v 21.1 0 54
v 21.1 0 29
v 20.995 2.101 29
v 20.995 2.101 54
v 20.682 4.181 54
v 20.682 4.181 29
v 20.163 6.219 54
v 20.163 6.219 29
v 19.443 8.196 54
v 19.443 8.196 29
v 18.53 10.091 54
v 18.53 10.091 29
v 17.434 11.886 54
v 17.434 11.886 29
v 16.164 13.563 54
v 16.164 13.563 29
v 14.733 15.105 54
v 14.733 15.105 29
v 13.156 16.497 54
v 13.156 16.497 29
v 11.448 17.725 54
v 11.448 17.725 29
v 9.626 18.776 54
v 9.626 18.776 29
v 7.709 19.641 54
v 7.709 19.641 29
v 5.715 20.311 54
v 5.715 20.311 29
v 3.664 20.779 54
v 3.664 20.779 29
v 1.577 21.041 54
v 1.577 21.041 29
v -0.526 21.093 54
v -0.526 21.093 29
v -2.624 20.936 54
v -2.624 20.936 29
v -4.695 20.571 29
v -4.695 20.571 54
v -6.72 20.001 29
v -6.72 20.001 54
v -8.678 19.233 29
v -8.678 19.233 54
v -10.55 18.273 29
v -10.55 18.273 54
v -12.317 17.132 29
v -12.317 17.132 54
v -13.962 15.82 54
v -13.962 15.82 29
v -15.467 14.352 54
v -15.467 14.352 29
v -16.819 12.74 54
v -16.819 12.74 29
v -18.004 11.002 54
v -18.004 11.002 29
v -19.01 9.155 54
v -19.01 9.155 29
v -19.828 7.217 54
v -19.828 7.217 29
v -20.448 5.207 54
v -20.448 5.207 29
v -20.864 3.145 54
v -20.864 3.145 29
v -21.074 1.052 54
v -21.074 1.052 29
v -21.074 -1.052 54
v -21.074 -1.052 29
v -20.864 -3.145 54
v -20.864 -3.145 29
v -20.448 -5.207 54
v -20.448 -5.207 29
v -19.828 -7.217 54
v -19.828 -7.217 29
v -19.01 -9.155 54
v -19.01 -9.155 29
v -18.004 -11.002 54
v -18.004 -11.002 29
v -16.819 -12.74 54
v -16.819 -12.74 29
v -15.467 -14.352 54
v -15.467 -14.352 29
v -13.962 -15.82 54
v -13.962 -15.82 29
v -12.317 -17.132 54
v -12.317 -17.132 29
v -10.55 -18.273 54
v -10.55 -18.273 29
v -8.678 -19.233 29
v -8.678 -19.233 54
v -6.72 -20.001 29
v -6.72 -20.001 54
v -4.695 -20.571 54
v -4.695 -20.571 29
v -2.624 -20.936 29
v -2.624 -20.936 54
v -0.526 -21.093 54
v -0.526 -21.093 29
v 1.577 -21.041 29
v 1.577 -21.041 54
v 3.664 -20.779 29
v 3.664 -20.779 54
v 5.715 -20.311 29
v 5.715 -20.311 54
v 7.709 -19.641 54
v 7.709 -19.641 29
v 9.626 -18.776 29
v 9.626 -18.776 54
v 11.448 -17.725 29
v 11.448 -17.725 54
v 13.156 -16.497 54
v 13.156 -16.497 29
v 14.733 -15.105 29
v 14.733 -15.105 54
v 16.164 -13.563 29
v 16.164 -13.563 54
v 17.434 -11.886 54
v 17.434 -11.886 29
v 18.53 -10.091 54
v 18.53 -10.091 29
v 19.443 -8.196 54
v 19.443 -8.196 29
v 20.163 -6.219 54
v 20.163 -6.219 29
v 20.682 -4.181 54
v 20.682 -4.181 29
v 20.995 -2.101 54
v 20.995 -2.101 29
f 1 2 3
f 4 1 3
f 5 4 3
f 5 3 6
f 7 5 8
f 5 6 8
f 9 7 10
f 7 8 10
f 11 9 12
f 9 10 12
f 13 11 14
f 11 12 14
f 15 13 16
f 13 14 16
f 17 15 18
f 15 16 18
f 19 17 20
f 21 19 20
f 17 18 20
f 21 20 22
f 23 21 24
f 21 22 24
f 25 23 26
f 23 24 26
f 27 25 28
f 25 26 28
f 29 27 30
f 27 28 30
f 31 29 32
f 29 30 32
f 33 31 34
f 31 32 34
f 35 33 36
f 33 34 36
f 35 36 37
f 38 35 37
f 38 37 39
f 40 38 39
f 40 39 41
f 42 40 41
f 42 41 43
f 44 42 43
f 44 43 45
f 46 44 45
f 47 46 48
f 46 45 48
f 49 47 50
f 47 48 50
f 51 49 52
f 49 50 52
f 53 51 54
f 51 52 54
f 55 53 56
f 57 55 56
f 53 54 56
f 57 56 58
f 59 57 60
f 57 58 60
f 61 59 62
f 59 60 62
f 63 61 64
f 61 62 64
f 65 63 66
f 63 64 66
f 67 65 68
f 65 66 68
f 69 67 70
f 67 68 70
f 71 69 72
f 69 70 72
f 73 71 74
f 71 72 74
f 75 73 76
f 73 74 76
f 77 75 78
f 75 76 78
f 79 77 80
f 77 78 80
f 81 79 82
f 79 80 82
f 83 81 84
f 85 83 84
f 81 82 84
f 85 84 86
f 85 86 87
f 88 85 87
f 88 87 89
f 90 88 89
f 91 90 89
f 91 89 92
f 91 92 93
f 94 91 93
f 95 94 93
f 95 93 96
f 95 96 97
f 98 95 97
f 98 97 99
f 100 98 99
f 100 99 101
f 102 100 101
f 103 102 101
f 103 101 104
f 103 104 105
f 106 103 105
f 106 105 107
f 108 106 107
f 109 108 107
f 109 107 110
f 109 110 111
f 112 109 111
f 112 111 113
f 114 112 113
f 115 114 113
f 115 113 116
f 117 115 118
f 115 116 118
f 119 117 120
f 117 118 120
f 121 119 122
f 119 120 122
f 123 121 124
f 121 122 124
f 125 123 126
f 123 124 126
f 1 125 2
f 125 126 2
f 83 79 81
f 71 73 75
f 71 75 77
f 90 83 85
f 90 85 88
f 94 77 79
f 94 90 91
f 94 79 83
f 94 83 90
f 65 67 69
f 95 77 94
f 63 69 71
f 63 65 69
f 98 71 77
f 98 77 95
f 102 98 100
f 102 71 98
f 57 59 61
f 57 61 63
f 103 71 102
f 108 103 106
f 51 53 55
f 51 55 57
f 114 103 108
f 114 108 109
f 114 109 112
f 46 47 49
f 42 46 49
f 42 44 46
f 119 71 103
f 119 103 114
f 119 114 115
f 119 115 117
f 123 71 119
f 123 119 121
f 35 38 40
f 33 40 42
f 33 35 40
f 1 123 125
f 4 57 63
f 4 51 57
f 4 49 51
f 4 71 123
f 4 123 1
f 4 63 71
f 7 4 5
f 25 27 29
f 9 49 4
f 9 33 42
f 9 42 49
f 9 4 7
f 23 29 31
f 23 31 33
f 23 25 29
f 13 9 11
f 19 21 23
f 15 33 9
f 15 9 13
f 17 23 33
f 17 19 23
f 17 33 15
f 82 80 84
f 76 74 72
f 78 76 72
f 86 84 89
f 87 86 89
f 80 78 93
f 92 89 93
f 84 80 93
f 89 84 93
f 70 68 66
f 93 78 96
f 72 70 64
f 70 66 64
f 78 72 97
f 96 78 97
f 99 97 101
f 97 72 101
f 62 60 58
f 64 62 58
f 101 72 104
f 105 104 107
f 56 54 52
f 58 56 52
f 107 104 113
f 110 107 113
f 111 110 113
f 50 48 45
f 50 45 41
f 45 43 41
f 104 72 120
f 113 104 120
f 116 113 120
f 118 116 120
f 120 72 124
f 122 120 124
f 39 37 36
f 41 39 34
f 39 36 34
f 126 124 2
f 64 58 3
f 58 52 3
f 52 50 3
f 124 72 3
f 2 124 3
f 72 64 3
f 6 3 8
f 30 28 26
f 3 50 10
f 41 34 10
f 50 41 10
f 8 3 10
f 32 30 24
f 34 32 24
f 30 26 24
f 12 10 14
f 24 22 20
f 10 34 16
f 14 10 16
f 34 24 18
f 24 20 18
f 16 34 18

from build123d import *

# Parameters (mm, degrees)
BOSS_EXTRUDE1_OUTLINE_R = 21.1
BOSS_EXTRUDE1_DEPTH     = 25


# Read off the part's stored shape, not the designer's step: Boss-Extrude1
with BuildPart() as part:
    # Boss-Extrude1 outline → Boss-Extrude1 (new body)
    with BuildSketch(Plane.XY.offset(29)):
        Circle(BOSS_EXTRUDE1_OUTLINE_R)
    extrude(amount=BOSS_EXTRUDE1_DEPTH)


solid = part.part
